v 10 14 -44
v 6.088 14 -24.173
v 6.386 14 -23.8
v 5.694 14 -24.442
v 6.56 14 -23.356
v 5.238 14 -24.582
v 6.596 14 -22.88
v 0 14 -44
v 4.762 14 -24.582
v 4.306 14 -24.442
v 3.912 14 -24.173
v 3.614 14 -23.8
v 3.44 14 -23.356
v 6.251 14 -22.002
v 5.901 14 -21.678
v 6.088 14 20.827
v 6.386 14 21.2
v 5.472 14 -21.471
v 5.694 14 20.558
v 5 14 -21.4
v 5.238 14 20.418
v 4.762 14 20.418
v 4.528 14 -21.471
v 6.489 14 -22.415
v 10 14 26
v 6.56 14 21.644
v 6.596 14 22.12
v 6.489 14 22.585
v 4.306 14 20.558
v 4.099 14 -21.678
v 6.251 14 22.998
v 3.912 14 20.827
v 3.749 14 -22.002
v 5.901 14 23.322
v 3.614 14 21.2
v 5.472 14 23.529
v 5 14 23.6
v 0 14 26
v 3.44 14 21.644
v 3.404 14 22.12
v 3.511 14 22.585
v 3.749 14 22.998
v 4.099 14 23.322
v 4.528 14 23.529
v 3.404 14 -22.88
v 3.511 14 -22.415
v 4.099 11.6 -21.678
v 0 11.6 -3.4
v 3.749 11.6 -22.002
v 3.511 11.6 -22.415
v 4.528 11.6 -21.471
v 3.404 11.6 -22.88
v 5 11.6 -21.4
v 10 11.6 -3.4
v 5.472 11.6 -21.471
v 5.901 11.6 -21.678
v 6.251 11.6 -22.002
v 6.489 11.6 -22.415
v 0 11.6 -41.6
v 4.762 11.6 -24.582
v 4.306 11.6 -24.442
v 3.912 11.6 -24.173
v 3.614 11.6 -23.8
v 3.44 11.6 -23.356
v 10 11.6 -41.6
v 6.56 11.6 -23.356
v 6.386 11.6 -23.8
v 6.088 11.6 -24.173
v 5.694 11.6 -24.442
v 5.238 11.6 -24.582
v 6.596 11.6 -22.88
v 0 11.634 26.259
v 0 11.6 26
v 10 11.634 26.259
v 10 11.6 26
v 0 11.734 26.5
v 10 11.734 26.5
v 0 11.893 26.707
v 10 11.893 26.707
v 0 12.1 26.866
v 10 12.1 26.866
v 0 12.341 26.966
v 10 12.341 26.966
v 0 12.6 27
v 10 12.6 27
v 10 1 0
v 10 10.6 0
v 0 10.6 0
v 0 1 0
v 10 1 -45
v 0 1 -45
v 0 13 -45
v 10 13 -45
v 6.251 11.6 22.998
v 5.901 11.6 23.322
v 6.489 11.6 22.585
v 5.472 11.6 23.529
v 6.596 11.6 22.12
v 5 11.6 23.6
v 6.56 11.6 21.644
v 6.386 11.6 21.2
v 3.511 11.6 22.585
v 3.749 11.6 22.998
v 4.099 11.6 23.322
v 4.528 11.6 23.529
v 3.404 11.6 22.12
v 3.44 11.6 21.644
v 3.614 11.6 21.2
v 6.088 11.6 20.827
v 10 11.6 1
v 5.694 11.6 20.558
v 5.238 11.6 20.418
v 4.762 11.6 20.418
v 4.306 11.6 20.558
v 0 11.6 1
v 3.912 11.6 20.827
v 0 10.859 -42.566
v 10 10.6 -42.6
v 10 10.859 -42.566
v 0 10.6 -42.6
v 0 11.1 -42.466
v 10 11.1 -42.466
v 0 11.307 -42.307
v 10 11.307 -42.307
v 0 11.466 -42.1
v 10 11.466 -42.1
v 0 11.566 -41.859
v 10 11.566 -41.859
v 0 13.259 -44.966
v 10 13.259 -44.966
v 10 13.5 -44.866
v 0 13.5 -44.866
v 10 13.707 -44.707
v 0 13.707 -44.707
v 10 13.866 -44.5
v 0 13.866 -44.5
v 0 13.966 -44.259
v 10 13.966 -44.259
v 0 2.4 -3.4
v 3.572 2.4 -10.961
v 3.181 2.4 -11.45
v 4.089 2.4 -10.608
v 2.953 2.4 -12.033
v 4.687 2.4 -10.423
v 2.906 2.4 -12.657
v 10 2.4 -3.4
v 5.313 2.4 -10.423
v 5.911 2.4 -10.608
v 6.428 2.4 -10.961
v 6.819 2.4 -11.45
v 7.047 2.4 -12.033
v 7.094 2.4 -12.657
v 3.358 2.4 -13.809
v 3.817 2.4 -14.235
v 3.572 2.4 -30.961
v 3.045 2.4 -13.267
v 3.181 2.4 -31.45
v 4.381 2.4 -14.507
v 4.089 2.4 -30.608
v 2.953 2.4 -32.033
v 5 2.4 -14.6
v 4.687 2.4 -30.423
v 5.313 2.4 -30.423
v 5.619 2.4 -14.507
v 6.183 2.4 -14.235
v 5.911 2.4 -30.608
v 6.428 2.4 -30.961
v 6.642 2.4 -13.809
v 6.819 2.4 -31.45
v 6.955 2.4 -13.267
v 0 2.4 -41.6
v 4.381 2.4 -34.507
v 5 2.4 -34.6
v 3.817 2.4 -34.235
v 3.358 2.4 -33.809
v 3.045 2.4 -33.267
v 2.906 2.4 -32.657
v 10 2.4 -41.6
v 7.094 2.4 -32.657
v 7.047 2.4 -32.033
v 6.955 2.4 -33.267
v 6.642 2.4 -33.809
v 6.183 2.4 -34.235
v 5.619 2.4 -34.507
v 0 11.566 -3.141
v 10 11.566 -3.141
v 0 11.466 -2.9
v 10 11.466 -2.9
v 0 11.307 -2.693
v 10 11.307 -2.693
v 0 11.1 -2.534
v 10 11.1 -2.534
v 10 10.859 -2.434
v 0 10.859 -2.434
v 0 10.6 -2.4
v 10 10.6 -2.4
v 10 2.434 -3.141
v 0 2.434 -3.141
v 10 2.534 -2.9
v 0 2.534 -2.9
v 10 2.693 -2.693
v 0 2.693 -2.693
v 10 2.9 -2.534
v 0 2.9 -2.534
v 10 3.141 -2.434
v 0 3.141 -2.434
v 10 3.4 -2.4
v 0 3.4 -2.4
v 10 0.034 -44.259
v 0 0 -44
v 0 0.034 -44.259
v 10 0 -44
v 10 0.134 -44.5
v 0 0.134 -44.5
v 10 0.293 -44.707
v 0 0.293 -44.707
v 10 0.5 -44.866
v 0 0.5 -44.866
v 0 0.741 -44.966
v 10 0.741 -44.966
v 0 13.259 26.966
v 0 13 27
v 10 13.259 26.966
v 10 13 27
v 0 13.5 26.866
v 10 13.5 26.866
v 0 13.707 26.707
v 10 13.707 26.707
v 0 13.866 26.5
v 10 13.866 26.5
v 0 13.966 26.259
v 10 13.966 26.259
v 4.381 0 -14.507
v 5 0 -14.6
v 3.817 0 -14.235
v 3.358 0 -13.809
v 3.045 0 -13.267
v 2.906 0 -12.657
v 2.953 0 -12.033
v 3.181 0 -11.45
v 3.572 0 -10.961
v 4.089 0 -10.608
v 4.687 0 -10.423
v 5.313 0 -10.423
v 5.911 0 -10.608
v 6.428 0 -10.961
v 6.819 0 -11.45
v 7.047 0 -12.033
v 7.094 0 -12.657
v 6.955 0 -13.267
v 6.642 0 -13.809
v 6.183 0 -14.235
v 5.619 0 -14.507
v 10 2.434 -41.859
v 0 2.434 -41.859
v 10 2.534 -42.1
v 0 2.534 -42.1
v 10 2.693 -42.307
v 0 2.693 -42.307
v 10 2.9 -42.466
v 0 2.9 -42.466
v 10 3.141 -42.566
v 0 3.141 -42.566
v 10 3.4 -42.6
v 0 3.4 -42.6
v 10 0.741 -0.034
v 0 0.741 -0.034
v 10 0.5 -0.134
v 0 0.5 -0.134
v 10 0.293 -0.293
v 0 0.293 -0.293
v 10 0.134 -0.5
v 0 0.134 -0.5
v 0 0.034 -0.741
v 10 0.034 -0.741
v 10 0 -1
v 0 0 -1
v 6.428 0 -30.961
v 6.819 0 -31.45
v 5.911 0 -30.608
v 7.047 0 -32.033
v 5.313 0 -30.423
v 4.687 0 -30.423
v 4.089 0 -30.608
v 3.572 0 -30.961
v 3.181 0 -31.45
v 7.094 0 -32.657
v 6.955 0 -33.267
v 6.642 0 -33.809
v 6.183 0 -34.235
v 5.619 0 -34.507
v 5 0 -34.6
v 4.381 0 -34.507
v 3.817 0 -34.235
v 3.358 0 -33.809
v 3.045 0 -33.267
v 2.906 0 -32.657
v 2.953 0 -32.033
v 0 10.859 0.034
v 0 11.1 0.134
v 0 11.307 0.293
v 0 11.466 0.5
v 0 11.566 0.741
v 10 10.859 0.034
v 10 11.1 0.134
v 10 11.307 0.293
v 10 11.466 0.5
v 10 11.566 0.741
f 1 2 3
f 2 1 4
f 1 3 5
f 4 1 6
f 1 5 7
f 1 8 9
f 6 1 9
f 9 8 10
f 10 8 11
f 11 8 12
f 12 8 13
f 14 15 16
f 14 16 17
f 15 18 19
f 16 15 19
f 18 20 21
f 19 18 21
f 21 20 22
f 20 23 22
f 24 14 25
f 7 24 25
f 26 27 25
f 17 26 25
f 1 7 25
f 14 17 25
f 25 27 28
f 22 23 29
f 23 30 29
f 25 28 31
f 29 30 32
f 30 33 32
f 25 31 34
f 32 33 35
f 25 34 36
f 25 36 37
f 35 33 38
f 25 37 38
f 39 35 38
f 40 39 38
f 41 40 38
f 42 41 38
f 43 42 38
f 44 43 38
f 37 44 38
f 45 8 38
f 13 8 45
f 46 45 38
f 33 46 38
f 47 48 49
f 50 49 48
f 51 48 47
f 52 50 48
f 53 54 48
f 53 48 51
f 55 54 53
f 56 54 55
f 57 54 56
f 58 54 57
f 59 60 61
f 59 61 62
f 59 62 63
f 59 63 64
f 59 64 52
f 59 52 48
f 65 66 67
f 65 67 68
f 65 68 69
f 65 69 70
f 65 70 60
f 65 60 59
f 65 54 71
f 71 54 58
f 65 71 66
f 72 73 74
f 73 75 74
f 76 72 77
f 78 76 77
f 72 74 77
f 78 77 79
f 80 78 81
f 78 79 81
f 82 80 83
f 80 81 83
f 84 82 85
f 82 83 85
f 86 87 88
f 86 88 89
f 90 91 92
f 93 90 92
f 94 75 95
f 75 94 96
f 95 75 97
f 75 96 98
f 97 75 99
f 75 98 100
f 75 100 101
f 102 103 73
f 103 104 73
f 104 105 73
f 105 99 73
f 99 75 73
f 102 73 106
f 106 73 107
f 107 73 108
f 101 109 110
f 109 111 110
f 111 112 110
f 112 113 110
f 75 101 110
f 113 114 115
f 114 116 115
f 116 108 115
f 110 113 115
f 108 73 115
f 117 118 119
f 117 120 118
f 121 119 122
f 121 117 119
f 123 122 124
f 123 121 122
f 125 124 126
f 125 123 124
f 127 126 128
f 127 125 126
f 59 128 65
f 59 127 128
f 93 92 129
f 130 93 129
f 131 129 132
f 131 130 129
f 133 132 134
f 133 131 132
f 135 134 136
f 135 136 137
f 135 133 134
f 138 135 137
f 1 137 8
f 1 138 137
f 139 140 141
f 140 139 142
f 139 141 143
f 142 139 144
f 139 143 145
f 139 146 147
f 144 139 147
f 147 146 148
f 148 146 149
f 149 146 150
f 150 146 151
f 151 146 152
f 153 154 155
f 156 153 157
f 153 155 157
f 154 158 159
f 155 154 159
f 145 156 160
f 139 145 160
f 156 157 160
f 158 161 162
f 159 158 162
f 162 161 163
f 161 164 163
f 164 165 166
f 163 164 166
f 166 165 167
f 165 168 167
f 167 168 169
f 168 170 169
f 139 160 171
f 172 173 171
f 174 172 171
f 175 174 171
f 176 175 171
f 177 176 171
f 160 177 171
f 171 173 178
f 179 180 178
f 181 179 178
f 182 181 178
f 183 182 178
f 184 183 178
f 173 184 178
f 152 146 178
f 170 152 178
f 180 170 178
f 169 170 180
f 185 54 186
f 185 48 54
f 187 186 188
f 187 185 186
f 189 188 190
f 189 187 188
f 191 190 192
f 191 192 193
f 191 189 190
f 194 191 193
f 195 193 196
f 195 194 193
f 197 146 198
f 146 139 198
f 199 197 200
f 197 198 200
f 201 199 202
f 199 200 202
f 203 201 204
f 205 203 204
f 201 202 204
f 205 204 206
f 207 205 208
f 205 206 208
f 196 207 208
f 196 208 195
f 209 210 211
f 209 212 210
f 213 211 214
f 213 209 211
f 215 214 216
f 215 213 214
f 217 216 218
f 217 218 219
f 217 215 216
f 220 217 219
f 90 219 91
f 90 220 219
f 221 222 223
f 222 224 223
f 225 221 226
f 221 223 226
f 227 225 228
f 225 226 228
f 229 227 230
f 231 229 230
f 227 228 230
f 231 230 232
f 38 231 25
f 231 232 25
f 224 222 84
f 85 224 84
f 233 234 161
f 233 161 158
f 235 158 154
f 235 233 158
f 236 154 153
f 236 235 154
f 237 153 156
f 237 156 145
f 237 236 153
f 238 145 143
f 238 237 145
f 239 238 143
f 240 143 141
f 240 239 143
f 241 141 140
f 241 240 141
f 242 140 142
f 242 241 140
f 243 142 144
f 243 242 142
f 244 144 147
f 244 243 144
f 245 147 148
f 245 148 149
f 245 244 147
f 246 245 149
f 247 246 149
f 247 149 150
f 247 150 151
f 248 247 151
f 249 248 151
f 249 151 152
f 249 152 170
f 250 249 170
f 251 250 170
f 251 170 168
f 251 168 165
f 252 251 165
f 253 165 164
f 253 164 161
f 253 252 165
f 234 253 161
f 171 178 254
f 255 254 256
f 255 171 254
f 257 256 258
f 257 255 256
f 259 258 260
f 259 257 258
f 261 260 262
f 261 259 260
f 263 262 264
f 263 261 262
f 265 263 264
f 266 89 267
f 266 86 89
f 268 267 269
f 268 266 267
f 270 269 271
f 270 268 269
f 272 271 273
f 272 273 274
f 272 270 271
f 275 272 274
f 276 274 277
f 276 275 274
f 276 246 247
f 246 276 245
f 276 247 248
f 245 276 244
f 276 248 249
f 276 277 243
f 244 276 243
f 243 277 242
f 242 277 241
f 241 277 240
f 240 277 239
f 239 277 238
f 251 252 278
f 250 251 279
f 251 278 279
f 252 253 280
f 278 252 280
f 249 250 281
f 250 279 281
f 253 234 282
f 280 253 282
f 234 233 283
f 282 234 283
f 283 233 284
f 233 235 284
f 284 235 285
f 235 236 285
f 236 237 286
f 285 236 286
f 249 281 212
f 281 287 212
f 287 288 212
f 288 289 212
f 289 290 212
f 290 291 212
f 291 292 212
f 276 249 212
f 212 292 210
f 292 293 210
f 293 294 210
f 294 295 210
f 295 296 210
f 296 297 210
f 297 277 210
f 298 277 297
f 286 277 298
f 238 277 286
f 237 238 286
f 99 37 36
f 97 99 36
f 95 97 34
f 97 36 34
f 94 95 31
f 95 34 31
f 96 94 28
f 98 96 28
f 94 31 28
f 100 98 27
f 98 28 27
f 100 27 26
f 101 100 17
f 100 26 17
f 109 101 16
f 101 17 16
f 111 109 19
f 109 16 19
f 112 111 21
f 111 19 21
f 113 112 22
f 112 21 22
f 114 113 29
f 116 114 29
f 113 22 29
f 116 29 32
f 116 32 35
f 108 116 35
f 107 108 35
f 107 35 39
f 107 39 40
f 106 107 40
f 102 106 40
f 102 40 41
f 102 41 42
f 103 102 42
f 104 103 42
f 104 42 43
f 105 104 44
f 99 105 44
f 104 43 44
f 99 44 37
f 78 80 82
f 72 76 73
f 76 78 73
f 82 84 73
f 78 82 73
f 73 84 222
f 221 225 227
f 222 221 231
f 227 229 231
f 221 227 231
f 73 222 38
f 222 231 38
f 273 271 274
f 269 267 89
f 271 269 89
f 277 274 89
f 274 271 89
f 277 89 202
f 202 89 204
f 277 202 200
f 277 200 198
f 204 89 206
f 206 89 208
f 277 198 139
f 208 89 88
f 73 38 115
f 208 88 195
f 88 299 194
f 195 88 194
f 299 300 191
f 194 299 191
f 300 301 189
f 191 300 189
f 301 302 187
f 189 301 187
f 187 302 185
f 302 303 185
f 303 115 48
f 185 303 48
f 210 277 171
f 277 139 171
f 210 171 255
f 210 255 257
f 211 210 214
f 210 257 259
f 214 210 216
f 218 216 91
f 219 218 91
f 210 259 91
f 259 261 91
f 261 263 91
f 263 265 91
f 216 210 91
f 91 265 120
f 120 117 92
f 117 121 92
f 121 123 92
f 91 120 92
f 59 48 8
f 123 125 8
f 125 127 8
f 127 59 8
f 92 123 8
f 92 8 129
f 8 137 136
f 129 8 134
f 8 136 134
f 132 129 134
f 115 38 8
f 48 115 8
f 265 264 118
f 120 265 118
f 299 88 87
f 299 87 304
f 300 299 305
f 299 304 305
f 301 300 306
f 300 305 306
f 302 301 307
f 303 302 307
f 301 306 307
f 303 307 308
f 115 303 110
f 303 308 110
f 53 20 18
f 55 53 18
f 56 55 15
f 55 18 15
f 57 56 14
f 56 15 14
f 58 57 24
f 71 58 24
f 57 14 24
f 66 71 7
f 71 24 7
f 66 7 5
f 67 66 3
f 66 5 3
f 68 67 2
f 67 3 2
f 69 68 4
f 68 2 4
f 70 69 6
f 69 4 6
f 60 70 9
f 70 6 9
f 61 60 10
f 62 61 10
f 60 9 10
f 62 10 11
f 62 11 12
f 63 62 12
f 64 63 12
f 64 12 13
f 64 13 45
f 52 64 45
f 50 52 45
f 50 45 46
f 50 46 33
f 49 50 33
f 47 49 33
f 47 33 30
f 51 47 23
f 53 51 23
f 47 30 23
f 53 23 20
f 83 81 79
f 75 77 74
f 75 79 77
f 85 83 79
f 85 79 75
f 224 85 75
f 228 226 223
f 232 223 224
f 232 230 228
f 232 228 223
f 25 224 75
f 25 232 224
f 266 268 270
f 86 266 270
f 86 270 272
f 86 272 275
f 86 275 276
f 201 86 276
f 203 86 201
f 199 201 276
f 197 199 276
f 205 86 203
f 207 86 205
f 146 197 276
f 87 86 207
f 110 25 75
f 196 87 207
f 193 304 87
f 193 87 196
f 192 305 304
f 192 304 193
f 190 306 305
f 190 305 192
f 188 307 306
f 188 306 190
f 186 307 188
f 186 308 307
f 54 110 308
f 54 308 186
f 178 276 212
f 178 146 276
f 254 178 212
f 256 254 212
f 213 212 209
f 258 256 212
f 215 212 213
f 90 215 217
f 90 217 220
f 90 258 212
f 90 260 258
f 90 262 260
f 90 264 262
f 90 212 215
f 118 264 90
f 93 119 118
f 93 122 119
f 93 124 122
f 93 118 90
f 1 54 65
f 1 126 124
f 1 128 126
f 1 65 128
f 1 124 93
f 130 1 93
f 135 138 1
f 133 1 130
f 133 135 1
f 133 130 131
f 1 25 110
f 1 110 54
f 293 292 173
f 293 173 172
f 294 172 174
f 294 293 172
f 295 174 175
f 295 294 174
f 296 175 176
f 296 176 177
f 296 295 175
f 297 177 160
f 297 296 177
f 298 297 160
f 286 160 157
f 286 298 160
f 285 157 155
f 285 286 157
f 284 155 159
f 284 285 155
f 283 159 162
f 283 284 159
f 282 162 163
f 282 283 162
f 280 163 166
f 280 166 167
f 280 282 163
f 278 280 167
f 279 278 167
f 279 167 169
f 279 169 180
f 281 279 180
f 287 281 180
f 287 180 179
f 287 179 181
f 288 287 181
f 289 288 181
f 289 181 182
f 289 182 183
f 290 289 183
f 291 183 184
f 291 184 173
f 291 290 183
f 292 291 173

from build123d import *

# Parameters (mm, degrees)
BOSS_EXTRUDE1_DEPTH = 10
SKETCH4_W           = 40.2
SKETCH4_H           = 9.2
CUT_EXTRUDE1_DEPTH  = 49.176757882
SKETCH3_R           = 2.1
CUT_EXTRUDE2_DEPTH  = 2.4
SKETCH5_R           = 1.6
CUT_EXTRUDE3_DEPTH  = 2.4
FILLET1_R           = 1


with BuildPart() as part:
    # Sketch1 → Boss-Extrude1 (new body)
    with BuildSketch(Plane(origin=(0, 0, 0), x_dir=(0, 0, -1), z_dir=(1, 0, 0))):
        Polygon((0, 11.6), (0, 0), (45, 0), (45, 14), (0, 14), (-27, 14), (-27, 11.6), align=None)
    extrude(amount=BOSS_EXTRUDE1_DEPTH)

    # Sketch4 → Cut-Extrude1 (cut, through all)
    with BuildSketch(Plane(origin=(10, 0, 0), x_dir=(0, 0, -1), z_dir=(1, 0, 0))):
        with Locations((22.5, 7)):
            Rectangle(SKETCH4_W, SKETCH4_H)
    extrude(amount=-CUT_EXTRUDE1_DEPTH, mode=Mode.SUBTRACT)

    # Sketch3 → Cut-Extrude2 (cut)
    with BuildSketch(Plane(origin=(0, 0, 0), x_dir=(1, 0, 0), z_dir=(0, 1, 0))):
        with Locations(Location((5, 32.5, 0), (0, 0, 90))):
            Circle(SKETCH3_R)
        with Locations(Location((5, 12.5, 0), (0, 0, 90))):
            Circle(SKETCH3_R)
    extrude(amount=CUT_EXTRUDE2_DEPTH, mode=Mode.SUBTRACT)

    # Sketch5 → Cut-Extrude3 (cut)
    with BuildSketch(Plane(origin=(0, 14, 0), x_dir=(1, 0, 0), z_dir=(0, 1, 0))):
        with Locations(Location((5, 23, 0), (0, 0, 270))):
            Circle(SKETCH5_R)
        with Locations(Location((5, -22, 0), (0, 0, 270))):
            Circle(SKETCH5_R)
    extrude(amount=-CUT_EXTRUDE3_DEPTH, mode=Mode.SUBTRACT)

    # Fillet1
    fillet1_edges = [part.edges().sort_by_distance(p)[0] for p in [
        (5, 0, 0),
        (5, 11.6, 0),
        (5, 11.6, 27),
        (5, 14, 27),
        (5, 14, -45),
        (5, 0, -45),
        (5, 2.4, -2.4),
        (5, 11.6, -2.4),
        (5, 11.6, -42.6),
        (5, 2.4, -42.6),
    ]]
    fillet(fillet1_edges, radius=FILLET1_R)


solid = part.part
